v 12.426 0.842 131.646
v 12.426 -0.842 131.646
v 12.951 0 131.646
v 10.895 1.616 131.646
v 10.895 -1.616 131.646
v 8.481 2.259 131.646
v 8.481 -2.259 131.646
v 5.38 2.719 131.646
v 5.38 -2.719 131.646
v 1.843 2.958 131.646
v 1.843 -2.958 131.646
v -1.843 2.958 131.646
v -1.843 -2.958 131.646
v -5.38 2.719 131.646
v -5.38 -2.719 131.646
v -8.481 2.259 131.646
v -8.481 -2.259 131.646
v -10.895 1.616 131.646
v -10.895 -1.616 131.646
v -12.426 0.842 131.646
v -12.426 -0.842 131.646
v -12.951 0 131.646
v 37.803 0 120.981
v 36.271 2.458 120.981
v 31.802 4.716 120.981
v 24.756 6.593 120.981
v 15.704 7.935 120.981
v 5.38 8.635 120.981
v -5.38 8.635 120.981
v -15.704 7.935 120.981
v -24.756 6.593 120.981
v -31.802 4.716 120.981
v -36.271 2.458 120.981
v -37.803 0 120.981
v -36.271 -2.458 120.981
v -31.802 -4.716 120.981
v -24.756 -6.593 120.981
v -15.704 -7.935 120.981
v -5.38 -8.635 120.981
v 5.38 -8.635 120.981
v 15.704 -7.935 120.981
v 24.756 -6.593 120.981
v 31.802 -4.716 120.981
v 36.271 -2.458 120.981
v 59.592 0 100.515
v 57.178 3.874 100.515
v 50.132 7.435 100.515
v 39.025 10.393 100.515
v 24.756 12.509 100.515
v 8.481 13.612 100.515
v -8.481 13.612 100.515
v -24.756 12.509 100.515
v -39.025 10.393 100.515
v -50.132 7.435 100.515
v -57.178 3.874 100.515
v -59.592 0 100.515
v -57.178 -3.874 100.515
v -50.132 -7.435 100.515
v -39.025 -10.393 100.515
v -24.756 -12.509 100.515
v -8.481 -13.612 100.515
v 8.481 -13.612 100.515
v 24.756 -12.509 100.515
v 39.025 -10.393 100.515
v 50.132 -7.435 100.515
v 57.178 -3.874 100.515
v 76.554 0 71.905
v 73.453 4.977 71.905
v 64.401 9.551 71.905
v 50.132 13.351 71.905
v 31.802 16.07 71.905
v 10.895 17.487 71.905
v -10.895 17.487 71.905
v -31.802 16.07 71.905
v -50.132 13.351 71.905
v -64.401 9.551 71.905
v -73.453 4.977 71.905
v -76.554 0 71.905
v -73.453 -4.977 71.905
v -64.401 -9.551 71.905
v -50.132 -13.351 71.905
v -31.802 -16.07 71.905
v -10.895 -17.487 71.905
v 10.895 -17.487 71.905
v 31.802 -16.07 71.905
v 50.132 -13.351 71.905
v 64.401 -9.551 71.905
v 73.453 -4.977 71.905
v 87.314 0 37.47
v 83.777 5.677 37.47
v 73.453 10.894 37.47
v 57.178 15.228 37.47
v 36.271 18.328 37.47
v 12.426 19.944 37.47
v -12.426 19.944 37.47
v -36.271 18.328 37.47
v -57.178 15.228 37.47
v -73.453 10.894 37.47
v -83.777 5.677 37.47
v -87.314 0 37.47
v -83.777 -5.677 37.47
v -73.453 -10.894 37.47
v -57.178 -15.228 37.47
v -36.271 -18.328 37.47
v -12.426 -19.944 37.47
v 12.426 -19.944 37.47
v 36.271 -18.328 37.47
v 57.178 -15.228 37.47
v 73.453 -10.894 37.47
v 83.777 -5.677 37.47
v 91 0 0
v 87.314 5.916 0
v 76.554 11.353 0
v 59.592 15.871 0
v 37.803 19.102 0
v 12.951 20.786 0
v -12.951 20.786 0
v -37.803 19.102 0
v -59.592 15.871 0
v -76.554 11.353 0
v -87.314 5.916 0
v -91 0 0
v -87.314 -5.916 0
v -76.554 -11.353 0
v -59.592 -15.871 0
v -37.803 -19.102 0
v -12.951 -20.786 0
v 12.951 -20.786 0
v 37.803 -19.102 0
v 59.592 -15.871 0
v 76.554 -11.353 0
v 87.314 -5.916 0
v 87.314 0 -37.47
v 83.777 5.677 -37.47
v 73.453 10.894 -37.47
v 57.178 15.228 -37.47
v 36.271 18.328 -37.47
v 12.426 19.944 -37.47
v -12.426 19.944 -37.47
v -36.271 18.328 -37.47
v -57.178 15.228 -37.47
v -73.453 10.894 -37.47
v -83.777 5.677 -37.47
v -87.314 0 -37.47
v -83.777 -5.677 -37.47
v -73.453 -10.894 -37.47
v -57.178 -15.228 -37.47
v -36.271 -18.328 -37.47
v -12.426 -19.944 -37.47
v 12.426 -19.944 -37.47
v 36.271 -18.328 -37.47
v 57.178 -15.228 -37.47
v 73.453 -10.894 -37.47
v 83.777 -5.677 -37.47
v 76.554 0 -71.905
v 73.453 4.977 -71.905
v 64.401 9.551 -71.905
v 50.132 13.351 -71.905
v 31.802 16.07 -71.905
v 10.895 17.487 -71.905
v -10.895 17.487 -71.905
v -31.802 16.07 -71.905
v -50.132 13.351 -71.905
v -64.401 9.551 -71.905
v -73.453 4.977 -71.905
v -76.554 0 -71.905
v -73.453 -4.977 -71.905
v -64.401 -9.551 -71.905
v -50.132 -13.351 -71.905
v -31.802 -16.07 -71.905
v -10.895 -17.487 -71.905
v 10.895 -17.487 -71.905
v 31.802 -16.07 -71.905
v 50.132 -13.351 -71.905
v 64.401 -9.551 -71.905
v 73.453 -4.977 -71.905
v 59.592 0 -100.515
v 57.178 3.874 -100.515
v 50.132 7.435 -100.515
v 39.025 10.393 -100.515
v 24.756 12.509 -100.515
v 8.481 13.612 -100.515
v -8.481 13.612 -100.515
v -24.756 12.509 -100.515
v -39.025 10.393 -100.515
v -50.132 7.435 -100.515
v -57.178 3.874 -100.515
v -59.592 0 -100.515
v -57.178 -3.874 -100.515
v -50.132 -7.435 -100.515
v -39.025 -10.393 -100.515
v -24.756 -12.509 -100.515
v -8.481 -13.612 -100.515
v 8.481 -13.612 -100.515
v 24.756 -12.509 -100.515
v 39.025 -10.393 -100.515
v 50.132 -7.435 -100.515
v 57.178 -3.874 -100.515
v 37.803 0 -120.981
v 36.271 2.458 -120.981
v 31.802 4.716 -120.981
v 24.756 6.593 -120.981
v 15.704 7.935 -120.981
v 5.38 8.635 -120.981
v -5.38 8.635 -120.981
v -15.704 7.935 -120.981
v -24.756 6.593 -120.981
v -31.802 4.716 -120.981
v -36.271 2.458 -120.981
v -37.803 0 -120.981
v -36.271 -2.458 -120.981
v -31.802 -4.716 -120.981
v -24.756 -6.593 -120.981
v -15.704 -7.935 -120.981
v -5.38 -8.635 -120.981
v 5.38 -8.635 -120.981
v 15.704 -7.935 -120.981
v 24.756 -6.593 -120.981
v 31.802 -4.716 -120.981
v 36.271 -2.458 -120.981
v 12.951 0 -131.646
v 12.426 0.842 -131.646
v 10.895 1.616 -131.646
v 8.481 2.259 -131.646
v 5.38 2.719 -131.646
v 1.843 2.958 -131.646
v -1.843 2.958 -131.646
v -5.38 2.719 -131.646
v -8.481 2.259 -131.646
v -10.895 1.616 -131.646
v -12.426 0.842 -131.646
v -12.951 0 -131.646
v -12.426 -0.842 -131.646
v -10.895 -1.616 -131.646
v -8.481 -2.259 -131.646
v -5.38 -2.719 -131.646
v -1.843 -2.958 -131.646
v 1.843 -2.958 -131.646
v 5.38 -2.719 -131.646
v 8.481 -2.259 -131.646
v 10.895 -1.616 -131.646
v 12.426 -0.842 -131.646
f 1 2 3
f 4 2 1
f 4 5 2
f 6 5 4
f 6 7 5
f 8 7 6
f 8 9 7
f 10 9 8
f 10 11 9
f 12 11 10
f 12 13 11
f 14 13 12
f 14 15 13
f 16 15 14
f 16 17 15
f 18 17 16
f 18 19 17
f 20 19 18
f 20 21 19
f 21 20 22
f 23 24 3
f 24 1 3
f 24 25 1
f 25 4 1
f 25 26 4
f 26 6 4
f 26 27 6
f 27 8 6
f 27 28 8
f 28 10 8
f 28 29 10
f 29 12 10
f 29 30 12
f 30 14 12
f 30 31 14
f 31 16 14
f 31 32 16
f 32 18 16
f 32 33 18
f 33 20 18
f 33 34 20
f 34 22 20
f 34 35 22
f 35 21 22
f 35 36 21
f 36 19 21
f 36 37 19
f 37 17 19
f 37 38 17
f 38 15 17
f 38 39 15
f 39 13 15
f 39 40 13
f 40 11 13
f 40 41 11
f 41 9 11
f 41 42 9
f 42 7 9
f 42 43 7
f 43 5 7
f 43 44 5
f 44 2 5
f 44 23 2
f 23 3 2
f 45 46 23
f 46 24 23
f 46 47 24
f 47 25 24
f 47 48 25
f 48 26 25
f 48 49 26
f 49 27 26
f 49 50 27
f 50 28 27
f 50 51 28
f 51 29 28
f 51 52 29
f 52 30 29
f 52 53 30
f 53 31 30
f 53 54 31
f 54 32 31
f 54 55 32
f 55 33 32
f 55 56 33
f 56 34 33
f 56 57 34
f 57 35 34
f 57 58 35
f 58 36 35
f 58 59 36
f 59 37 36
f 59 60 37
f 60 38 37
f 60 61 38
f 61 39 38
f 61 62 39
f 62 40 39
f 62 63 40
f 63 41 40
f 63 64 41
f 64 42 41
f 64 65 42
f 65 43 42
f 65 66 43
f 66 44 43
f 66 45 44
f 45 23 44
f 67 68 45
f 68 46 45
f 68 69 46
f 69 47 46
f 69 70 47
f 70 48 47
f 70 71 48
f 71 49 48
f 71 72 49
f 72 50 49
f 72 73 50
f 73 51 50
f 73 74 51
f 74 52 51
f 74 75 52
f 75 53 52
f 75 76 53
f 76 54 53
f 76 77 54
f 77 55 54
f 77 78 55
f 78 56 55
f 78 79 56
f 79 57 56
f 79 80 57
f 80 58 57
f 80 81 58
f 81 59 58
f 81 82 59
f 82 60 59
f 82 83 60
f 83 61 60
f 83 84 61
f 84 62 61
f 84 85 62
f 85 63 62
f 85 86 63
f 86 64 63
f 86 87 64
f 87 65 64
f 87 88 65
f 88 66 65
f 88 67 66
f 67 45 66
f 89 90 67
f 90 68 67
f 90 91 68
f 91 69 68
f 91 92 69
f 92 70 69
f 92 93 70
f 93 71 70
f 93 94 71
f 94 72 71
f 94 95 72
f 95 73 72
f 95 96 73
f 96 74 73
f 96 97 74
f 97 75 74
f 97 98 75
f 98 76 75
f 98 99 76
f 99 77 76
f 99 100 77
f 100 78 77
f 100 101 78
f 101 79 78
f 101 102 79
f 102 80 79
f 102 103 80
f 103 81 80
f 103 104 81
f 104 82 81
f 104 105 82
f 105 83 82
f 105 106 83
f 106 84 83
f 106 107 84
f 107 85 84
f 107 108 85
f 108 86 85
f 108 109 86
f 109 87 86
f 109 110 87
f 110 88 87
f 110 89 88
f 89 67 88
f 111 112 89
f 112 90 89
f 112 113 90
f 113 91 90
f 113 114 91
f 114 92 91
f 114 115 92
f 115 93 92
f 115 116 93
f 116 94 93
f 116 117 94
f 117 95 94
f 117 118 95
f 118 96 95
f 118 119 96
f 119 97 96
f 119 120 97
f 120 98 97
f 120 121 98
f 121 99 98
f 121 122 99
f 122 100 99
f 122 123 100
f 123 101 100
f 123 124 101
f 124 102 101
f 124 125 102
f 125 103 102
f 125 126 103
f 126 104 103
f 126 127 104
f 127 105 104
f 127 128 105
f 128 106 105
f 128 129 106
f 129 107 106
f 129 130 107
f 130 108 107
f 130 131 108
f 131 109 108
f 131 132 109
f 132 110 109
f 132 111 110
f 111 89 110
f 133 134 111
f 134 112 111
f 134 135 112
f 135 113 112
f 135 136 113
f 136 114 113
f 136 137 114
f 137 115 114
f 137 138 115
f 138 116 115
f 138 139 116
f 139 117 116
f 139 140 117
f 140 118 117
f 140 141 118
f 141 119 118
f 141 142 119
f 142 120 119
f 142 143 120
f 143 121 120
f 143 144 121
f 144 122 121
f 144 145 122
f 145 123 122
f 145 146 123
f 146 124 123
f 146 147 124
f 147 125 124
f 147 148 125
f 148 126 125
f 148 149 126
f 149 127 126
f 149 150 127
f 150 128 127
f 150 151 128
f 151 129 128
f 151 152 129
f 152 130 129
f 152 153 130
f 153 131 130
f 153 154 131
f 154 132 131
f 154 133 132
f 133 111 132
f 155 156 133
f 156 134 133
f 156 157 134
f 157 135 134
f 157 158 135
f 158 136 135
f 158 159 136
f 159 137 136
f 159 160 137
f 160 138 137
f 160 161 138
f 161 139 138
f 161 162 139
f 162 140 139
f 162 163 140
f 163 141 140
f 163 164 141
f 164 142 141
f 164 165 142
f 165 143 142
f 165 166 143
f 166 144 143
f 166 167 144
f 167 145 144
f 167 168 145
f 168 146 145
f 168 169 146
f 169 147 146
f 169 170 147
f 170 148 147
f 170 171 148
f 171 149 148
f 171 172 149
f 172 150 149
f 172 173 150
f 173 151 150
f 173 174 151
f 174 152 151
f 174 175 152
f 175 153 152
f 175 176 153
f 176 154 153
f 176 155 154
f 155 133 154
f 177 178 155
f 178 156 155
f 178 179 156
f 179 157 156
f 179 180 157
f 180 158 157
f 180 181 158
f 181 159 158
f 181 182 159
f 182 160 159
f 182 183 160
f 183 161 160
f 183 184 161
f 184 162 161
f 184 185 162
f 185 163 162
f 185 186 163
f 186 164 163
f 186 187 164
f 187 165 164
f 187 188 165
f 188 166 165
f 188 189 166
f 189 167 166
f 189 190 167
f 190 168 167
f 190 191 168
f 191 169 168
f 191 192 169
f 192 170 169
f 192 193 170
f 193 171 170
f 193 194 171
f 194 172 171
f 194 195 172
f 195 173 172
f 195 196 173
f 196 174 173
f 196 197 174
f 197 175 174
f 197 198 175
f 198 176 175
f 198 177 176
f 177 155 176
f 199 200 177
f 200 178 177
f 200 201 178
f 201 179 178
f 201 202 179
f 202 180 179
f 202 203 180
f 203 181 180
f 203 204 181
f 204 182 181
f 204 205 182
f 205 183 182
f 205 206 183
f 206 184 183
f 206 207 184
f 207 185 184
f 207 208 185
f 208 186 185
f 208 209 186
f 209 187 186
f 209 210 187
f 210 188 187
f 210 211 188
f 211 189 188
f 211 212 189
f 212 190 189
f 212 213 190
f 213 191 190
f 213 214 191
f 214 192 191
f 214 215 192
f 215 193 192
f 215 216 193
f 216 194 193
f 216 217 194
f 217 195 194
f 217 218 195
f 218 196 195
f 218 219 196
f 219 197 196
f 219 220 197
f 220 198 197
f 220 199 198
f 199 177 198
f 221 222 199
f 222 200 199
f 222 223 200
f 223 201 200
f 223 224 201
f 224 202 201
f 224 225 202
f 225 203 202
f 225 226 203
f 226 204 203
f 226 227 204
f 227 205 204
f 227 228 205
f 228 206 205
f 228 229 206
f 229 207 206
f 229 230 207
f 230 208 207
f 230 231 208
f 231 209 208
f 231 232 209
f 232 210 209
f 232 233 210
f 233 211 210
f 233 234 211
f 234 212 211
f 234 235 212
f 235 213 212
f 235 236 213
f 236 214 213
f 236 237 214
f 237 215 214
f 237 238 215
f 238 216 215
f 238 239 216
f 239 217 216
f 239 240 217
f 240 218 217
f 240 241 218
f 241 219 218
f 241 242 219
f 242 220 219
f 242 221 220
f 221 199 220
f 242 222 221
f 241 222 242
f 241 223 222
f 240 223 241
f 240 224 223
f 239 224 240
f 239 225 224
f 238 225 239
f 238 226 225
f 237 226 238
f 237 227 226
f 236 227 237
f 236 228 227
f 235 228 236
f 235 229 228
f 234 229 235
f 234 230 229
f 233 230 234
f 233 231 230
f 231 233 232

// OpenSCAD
// Generated by SolidPython 1.0.1 on 2020-07-29 00:46:50


scale(v = [13, 3, 19]) {
	sphere(r = 7);
}
/***********************************************
*********      SolidPython code:      **********
************************************************
 
# import packages: SolidPython
from solid import *
from solid.utils import *
from itertools import chain, combinations, permutations


class Resize:

    def __init__(self, scad_file):
        self.scad_file = scad_file
        #self.scad_file = import_scad(scad_file)
        # cone/cylinder param:
        self.r1 = 0
        self.r2 = 0
        self.h = 0
        # rectangular prism param:
        self.w = 0
        self.l = 0
        # ellipse param:
        self.r = 0

    # import OpenScad code (file name corresponds to shape)


    # classify shape + parameters
    def assign(self, param1, param2, param3):
        if self.scad_file == 'cone.scad':
            self.r1 = param1
            self.r2 = param2
            self.h = param3
        elif self.scad_file == 'cylinder.scad':
            self.r1 = param1
            self.r2 = param2
            self.h = param3
        elif self.scad_file == 'rectangularPrism.scad':
            self.h = param1
            self.l = param2
            self.w = param3
        else:
            self.r = param1
            self.h = param2

    # resize parameters
    def iterate(self):
        x = range(3, 20, 2)
        i = 1
        if self.scad_file == 'cone.scad':
            tempList = list(permutations(x, 2))
            for temp in tempList:
                param1 = temp[0]
                param2 = temp[1]
                filepath = 'produced_scad_files/' + 'cone' + str(param1) + '_' + str(param2) + '_' + '.scad'
                scad_render_to_file(cylinder(h=param1, r1=param2, r2=0), filepath)

        elif self.scad_file == 'cylinder.scad':
            tempList = list(permutations(x, 3))
            for temp in tempList:
                param1 = temp[0]
                param2 = temp[1]
                filepath = 'produced_scad_files/' + 'cylinder' + str(param1) + '_' + str(param2) + '_' + '.scad'
                scad_render_to_file(cylinder(h=param1, r1=param2, r2=param2), filepath)

        elif self.scad_file == 'rectangularPrism.scad':
            tempList = list(permutations(x, 3))
            for temp in tempList:
                param1 = temp[0]
                param2 = temp[1]
                param3 = temp[2]
                filepath = 'produced_scad_files/' + 'rectangularPrism' + str(param1) + '_' + str(param2) + '_' + str(
                    param3) + '.scad'
                scad_render_to_file(cube(size=(param1, param2, param3)), filepath)

        elif self.scad_file == 'ellipse.scad':
            tempList = list(permutations(x, 4))
            for temp in tempList:
                param1 = temp[0]
                param2 = temp[1]
                param3 = temp[2]
                param4 = temp[3]
                filepath = 'produced_scad_files/' + 'ellipse' + str(param1) + '_' + str(param2) + '_' + str(param3) + '_' + str(param4) + '.scad'
                scad_render_to_file(scale([param1, param2, param3])(sphere(r=param4)), filepath)

    def render_to_scadfile(self):
        scad_render_to_file(scad, 'example.scad') 
 
************************************************/
